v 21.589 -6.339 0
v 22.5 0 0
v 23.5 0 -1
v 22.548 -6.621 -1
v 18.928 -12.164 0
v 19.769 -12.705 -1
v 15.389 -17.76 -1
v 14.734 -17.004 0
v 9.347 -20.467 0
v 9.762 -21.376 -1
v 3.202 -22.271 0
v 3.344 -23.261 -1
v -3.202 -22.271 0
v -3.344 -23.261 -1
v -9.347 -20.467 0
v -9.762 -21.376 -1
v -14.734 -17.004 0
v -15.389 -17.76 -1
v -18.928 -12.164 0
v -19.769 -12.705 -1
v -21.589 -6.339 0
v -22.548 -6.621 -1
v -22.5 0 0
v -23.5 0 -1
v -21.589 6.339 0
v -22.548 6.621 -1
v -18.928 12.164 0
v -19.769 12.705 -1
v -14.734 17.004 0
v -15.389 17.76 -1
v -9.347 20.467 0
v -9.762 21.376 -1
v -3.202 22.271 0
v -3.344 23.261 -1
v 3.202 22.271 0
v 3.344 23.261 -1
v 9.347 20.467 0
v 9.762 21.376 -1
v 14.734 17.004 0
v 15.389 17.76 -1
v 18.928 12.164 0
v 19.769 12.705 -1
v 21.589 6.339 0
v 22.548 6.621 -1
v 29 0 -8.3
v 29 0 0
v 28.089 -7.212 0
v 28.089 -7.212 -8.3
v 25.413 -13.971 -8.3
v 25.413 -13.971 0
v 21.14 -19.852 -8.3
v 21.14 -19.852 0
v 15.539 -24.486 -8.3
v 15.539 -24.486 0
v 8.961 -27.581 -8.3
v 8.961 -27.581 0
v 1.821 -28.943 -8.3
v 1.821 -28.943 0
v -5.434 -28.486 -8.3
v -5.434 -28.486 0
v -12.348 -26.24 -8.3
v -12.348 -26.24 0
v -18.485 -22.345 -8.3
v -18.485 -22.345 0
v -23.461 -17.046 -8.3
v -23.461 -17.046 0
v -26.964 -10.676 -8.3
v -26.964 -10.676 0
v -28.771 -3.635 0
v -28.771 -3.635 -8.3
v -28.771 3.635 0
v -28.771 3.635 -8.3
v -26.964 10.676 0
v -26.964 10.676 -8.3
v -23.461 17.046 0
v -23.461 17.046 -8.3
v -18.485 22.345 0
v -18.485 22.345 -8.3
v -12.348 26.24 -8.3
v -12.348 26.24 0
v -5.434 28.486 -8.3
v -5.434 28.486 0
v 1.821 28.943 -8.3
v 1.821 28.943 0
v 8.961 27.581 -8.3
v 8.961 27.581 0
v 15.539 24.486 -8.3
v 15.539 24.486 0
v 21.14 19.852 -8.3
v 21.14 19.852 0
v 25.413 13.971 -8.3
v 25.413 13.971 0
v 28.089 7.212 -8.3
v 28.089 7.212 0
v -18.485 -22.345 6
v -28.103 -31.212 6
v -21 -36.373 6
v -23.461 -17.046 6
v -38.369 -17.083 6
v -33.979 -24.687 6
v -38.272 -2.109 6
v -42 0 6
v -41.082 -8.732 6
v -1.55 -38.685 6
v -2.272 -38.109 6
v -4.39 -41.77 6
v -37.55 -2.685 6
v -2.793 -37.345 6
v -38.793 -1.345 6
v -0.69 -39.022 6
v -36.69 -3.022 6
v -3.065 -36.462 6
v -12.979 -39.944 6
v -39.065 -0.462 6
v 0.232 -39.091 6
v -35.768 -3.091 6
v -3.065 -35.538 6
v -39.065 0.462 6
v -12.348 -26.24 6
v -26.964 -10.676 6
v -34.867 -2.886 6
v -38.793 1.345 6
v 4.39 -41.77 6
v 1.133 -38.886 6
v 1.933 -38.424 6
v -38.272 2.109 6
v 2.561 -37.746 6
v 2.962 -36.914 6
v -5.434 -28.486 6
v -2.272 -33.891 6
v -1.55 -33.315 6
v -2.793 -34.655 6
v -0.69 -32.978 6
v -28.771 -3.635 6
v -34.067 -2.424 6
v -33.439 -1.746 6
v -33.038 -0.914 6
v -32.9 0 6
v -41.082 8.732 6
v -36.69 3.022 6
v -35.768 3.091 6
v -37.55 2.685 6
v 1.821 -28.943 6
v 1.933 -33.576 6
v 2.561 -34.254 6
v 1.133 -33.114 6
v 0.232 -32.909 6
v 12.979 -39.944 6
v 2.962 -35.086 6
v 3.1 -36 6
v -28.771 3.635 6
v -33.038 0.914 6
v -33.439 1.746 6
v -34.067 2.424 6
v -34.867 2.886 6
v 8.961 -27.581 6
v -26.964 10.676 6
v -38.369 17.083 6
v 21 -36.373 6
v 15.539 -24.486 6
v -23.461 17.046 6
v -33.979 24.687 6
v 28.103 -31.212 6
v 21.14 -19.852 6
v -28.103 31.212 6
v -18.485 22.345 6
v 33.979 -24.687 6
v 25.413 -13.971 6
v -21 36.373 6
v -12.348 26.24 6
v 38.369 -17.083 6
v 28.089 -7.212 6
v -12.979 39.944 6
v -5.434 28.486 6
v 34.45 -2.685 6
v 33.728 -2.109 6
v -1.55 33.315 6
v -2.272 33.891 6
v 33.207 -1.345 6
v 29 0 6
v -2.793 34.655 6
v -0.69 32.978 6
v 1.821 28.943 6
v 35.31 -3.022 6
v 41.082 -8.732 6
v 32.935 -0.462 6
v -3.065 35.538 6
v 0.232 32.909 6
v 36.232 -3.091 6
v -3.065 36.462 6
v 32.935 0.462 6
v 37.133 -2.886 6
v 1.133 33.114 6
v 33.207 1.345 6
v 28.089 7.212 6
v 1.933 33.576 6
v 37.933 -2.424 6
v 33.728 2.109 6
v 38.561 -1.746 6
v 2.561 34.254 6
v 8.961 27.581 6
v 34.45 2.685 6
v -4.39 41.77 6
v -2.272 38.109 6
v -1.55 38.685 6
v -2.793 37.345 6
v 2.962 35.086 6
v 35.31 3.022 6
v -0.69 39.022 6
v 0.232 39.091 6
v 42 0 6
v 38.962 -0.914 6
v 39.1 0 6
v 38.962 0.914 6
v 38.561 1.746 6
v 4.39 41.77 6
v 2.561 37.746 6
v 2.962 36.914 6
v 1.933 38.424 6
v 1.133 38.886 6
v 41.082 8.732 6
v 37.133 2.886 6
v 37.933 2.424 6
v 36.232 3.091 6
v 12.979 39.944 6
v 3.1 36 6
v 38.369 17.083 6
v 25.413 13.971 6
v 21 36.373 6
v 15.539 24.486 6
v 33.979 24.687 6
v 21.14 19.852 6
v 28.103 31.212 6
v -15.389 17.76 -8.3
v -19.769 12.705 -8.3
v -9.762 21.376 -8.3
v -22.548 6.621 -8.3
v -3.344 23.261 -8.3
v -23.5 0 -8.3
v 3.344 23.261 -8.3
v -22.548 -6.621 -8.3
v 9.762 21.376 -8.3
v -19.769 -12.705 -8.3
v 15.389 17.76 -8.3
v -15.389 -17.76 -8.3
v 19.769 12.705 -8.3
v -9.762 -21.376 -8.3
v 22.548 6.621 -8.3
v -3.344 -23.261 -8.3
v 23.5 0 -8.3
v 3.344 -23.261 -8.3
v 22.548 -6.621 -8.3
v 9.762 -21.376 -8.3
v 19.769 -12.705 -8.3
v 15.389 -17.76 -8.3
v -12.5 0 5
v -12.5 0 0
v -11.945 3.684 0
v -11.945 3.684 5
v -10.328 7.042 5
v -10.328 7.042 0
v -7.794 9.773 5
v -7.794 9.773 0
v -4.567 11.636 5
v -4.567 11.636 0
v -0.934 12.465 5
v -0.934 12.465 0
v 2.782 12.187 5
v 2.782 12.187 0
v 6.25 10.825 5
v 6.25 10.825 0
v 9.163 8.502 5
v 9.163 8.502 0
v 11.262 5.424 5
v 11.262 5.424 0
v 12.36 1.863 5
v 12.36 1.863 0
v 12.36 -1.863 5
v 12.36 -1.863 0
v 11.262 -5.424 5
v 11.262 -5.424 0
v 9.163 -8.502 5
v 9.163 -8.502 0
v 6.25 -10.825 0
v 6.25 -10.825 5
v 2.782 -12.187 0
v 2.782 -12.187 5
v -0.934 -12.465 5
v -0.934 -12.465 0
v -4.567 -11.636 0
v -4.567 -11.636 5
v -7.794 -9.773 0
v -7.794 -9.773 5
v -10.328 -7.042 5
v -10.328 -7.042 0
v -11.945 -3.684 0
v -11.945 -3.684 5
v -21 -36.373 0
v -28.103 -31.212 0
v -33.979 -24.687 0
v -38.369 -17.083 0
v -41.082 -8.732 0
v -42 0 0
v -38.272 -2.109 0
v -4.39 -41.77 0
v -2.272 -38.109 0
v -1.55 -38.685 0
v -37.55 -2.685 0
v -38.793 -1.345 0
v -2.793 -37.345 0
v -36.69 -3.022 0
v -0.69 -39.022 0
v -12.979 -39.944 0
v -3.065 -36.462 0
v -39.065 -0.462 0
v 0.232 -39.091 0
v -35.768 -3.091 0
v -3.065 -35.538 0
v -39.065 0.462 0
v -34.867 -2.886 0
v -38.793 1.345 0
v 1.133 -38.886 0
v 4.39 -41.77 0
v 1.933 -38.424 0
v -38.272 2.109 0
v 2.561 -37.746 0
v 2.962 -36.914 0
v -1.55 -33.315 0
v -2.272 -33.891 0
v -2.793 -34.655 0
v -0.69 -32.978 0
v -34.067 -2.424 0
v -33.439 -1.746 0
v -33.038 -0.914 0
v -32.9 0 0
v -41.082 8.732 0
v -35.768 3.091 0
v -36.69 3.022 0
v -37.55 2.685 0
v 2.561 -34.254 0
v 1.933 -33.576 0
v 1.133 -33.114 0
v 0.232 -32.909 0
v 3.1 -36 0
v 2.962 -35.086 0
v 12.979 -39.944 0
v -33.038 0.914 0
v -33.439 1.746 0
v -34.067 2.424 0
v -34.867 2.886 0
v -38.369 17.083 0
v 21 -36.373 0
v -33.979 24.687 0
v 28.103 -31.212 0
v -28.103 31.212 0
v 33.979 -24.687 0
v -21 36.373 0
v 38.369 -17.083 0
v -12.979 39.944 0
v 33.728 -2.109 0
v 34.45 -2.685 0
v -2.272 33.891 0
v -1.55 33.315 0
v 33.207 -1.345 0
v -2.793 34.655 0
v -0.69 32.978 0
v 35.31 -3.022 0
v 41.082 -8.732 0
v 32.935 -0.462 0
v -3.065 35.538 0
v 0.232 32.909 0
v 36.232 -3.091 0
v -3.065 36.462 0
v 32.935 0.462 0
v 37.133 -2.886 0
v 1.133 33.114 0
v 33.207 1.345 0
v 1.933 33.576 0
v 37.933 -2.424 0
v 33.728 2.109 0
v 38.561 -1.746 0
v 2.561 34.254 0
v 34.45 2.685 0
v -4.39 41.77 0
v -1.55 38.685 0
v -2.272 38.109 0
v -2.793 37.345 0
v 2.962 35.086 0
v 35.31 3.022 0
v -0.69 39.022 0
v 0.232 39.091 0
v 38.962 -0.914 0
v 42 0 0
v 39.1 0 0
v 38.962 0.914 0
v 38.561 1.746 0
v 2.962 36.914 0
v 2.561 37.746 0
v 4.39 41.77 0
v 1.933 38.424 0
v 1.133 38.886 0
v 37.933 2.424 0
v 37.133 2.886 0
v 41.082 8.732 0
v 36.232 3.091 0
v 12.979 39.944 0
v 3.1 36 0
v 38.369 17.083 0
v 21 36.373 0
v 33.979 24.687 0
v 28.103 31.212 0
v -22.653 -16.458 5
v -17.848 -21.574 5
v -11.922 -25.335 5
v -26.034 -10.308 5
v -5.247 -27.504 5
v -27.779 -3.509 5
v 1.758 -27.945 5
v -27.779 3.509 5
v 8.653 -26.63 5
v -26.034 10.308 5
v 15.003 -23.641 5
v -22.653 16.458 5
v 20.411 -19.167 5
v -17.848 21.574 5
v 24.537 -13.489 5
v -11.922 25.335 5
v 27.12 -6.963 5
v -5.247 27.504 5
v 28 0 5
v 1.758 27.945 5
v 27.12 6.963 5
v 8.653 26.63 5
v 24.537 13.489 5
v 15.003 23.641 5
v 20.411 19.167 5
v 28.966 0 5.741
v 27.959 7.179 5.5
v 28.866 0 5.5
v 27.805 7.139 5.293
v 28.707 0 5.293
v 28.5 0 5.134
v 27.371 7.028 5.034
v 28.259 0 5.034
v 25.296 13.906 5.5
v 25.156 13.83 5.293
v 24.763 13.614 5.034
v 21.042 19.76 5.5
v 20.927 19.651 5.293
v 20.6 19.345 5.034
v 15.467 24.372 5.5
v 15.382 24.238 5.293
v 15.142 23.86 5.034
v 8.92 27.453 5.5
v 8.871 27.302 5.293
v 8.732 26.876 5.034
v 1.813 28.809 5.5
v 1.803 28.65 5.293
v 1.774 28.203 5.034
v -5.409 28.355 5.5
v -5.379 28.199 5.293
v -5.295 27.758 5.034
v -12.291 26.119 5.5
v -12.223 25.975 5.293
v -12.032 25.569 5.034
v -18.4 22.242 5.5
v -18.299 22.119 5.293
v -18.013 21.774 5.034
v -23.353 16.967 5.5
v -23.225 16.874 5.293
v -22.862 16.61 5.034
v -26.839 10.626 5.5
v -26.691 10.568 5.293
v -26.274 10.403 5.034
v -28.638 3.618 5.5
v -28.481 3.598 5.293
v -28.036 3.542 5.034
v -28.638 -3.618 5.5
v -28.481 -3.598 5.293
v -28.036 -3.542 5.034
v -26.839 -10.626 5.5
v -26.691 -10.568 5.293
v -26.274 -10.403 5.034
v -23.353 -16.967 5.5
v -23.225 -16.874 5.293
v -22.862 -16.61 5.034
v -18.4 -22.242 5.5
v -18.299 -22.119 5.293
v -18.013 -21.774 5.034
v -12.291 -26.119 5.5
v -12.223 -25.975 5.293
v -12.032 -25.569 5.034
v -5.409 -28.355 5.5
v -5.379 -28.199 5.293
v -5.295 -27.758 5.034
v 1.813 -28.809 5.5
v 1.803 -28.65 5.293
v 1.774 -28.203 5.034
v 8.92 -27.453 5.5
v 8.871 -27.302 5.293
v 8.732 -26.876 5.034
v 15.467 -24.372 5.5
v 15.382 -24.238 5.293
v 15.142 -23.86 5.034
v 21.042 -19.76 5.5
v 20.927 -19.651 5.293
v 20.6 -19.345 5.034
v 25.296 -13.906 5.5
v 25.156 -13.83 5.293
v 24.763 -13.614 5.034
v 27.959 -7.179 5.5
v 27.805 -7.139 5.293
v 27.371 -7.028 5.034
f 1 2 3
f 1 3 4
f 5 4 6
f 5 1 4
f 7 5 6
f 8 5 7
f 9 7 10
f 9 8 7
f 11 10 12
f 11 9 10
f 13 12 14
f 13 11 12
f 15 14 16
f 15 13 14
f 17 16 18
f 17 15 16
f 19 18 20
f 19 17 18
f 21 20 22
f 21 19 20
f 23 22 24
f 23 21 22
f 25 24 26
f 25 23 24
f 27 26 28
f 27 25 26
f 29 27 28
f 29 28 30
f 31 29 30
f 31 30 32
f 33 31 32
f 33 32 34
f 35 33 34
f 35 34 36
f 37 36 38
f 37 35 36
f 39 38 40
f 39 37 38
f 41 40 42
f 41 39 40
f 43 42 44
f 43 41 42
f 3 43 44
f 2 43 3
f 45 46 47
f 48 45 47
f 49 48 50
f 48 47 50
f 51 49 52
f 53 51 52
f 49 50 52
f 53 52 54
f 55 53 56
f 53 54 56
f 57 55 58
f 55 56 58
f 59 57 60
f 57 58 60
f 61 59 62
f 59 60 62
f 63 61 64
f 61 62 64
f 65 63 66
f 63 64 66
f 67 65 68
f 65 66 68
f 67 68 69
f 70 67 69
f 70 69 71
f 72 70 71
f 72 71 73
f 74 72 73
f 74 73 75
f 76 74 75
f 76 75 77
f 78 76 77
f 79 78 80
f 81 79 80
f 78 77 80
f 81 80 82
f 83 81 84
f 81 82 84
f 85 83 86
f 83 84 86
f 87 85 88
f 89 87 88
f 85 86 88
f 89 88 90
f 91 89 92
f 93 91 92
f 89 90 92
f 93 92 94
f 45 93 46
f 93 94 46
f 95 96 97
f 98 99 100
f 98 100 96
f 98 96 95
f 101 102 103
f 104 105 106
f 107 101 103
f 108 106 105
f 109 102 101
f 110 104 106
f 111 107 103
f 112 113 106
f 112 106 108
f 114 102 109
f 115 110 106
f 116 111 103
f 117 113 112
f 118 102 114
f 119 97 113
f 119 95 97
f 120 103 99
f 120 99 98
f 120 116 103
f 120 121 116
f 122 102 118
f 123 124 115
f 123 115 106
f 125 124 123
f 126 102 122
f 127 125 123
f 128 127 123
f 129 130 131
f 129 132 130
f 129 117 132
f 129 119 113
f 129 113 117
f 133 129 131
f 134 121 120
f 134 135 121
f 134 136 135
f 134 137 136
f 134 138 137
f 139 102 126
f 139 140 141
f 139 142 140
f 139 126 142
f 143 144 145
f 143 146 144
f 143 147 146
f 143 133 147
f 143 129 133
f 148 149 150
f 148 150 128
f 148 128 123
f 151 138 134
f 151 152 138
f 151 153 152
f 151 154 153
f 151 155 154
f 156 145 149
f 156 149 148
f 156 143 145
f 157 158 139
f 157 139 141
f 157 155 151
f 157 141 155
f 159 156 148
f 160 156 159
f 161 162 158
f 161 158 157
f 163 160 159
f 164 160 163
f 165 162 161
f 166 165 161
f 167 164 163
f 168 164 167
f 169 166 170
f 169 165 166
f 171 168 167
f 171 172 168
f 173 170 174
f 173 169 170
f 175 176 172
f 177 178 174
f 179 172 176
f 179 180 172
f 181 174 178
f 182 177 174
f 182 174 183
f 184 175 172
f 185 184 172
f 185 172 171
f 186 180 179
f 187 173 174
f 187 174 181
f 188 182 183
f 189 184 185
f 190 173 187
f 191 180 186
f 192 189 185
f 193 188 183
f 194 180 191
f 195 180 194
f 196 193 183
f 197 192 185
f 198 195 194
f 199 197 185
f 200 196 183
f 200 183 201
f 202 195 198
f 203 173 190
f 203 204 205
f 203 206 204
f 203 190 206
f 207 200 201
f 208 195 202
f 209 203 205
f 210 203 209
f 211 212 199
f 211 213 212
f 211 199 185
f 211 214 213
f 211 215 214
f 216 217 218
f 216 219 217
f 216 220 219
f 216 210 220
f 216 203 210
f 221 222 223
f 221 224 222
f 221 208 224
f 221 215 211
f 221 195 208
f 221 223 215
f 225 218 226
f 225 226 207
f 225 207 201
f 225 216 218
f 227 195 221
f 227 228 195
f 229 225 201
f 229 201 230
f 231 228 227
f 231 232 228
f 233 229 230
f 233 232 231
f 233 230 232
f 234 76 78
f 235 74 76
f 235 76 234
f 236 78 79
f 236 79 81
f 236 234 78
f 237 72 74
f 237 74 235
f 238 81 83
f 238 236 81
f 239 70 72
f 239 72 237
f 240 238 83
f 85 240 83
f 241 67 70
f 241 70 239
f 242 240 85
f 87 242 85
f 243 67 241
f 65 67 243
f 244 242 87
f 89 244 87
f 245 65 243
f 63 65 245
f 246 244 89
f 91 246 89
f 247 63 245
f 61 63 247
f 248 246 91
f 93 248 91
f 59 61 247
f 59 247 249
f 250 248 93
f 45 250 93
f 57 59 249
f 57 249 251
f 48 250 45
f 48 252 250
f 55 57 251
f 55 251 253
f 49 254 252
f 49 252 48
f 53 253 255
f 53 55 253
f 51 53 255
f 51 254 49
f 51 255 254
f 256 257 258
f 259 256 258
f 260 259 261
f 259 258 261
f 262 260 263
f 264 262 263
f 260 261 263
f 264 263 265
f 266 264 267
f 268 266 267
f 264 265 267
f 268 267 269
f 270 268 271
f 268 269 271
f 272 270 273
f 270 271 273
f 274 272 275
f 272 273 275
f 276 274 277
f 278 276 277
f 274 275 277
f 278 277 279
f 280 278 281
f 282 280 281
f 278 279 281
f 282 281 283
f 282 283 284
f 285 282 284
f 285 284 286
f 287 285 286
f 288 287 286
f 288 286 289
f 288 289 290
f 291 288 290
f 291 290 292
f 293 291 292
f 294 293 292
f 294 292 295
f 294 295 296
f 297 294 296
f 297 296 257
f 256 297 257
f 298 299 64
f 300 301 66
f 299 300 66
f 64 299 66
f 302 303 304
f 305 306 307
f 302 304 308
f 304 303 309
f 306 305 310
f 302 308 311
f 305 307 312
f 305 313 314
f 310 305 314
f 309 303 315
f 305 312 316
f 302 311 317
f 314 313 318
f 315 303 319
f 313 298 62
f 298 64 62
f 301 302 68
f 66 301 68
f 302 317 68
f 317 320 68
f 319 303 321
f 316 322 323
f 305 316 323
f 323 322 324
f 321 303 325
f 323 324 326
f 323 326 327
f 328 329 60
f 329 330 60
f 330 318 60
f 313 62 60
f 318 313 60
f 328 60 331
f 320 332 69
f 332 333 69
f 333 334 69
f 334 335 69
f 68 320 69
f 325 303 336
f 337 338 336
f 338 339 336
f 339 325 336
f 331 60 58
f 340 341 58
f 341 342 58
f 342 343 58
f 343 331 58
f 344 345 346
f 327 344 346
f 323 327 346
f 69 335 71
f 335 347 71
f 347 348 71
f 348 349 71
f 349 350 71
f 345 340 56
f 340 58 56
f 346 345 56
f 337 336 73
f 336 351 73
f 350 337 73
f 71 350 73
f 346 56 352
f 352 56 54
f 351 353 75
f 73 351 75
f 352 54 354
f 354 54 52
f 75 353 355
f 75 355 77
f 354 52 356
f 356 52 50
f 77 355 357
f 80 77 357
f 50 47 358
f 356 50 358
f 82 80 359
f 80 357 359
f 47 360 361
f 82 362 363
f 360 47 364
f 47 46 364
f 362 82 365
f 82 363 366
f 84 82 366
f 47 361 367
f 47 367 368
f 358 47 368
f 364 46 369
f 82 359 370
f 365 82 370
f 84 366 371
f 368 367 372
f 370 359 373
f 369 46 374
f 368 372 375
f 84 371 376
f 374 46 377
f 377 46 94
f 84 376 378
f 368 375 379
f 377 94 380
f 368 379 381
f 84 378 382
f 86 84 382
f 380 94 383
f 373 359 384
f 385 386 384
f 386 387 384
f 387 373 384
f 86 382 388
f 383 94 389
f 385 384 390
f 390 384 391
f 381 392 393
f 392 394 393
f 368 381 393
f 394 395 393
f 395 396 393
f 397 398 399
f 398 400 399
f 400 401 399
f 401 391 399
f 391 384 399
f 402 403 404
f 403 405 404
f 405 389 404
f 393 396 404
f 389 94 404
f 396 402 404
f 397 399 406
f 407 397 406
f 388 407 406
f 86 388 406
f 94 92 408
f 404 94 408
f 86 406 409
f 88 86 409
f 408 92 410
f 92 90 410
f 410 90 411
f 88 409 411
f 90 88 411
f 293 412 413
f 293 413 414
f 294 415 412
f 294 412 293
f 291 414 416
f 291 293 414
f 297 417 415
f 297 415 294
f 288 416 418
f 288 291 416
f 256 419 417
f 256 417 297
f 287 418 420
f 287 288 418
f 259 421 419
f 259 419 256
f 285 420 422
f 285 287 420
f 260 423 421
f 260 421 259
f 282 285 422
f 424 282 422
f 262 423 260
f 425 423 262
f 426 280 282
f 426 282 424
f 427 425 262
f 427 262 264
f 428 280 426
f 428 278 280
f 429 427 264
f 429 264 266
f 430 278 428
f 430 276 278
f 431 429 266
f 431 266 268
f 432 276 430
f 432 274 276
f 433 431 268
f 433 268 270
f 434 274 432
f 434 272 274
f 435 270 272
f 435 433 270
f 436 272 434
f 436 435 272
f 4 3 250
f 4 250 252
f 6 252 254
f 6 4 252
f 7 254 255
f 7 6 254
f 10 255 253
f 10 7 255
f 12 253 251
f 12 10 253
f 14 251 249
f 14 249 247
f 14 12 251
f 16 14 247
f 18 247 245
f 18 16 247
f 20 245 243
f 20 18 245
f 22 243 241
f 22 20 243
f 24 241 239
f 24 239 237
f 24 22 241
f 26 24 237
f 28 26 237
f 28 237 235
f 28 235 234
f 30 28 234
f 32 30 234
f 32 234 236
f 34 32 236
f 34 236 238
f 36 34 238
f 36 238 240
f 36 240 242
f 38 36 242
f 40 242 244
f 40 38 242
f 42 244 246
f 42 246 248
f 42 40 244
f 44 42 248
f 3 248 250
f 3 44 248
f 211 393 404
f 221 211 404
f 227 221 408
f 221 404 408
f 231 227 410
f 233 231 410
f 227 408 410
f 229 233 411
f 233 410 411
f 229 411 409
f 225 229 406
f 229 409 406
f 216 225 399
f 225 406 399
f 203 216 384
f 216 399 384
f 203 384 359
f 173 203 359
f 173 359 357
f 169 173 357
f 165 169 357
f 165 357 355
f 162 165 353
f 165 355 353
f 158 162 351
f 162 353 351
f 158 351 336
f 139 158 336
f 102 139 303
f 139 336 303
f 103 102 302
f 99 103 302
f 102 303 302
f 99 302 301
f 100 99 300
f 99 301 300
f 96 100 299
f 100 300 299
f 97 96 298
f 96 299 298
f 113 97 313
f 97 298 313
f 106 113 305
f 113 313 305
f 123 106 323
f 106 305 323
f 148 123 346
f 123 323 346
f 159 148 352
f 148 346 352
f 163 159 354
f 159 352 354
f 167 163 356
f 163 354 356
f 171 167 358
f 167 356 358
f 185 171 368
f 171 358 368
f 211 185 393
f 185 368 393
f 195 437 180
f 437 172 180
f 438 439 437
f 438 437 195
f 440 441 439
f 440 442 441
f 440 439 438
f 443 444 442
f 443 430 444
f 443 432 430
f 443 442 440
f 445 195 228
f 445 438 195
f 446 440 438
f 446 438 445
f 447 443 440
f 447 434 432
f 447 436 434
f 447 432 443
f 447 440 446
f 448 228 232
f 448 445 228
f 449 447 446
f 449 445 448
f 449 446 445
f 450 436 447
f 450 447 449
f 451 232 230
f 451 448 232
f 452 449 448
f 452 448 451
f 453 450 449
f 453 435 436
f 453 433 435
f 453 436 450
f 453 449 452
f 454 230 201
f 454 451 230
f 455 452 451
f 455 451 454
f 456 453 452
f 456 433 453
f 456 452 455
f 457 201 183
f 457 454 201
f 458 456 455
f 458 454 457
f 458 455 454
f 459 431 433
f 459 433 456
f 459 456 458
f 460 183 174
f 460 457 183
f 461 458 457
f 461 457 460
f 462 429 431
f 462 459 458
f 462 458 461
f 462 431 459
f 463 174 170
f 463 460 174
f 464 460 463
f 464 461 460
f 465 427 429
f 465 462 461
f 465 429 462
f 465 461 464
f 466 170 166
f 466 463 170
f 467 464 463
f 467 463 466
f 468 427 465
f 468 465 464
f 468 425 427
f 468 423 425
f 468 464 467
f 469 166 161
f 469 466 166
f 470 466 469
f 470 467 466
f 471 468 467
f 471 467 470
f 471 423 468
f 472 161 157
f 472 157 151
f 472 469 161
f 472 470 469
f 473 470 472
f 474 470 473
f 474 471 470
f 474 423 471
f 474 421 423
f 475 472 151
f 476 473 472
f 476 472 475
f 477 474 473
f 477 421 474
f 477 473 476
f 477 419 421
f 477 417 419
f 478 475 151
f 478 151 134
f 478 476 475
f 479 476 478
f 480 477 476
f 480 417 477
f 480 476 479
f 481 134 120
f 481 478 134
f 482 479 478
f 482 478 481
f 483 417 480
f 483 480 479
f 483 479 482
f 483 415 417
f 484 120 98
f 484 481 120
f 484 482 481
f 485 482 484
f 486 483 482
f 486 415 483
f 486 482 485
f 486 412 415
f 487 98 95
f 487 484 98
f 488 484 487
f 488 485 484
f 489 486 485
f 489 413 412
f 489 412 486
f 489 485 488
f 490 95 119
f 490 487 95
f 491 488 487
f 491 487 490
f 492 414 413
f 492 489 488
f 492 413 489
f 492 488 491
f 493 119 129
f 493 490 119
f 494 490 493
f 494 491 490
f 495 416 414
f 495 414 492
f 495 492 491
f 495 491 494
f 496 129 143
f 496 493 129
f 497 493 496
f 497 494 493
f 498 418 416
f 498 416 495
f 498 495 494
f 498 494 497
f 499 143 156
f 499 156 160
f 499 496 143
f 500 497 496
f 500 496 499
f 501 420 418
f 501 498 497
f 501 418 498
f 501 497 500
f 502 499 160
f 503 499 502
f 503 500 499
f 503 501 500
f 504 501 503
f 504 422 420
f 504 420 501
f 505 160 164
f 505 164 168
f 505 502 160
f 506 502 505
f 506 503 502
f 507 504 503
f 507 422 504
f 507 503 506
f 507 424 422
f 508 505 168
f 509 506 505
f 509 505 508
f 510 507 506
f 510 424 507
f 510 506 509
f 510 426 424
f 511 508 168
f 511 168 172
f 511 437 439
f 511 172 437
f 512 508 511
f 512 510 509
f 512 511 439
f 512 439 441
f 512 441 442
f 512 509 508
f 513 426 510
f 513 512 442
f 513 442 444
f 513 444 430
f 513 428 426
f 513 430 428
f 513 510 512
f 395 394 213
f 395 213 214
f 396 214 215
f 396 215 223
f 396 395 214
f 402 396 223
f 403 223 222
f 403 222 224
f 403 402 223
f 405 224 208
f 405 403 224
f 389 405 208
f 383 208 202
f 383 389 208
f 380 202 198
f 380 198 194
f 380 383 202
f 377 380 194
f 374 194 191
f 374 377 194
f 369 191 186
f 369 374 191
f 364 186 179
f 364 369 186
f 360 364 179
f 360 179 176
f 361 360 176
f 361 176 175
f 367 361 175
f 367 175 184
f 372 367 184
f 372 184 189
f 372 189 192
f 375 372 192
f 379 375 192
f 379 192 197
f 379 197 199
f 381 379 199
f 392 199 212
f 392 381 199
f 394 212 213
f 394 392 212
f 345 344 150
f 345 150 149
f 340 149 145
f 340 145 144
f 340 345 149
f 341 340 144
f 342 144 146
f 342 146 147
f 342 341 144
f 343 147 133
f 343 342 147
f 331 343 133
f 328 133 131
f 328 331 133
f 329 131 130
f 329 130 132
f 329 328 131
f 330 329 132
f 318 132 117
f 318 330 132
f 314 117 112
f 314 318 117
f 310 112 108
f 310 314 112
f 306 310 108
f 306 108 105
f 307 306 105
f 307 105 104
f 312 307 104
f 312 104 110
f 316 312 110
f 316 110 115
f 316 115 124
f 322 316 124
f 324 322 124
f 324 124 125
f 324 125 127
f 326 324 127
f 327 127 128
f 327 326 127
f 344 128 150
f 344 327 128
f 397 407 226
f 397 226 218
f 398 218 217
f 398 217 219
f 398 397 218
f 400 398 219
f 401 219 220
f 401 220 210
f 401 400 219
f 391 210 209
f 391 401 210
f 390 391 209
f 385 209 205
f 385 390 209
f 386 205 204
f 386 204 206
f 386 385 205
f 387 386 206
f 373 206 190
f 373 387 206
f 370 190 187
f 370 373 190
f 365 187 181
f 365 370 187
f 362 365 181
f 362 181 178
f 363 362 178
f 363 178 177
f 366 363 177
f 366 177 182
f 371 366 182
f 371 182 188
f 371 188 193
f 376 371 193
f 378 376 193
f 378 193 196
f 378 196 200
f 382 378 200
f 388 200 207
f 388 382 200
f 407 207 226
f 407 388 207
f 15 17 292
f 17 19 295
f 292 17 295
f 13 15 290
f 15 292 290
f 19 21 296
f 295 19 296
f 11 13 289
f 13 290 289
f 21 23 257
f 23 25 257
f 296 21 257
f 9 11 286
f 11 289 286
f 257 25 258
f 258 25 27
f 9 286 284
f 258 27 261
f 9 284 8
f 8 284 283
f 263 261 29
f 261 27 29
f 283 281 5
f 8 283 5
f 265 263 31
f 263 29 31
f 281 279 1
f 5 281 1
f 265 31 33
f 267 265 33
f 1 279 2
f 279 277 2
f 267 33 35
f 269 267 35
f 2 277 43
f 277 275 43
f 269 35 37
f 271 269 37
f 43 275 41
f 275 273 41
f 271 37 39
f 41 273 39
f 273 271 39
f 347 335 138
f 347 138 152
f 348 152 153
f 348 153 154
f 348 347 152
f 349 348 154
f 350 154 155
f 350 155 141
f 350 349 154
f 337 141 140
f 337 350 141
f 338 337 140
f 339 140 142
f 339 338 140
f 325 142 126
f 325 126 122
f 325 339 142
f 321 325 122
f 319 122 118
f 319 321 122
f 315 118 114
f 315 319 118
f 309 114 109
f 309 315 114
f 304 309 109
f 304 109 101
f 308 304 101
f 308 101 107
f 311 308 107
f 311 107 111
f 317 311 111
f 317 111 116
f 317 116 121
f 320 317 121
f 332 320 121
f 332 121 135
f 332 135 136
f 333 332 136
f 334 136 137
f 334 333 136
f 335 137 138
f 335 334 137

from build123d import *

# Parameters (mm, degrees)
SKETCH_1_R          = 42
SKETCH_1_R_2        = 3.1
EXTRUDE_1_DEPTH     = 6
SKETCH_2_R          = 29
CUT_EXTRUDE_1_DEPTH = 1
FILLET_3_R          = 1
SKETCH_3_R          = 29
SKETCH_3_R_2        = 23.5
EXTRUDE_2_DEPTH     = 8.3
CHAMFER_1_SIZE      = 1
SKETCH_4_R          = 12.5
CUT_EXTRUDE_2_DEPTH = 8.3


with BuildPart() as part:
    # Эскиз1 → Бобышка-Вытянуть1 (new body)
    with BuildSketch(Plane.XY):
        Circle(SKETCH_1_R)
        with Locations((0, 36)):
            Circle(SKETCH_1_R_2, mode=Mode.SUBTRACT)
        with Locations((36, 0)):
            Circle(SKETCH_1_R_2, mode=Mode.SUBTRACT)
        with Locations((0, -36)):
            Circle(SKETCH_1_R_2, mode=Mode.SUBTRACT)
        with Locations((-36, 0)):
            Circle(SKETCH_1_R_2, mode=Mode.SUBTRACT)
    extrude(amount=EXTRUDE_1_DEPTH)

    # Эскиз2 → Вырез-Вытянуть1 (cut)
    with BuildSketch(Plane.XY.offset(6)):
        Circle(SKETCH_2_R)
    extrude(amount=-CUT_EXTRUDE_1_DEPTH, mode=Mode.SUBTRACT)

    # Скругление3
    fillet_3_edges = [part.edges().sort_by_distance(p)[0] for p in [
        (-29, 0, 5),
    ]]
    fillet(fillet_3_edges, radius=FILLET_3_R - 0.0001)  # a hair under: the kernel refuses the full size

    # Эскиз3 → Бобышка-Вытянуть2 (add)
    with BuildSketch(Plane(origin=(0, 0, 0), x_dir=(-1, 0, 0), z_dir=(0, 0, -1))):
        with Locations(Location((0, 0, 0), (0, 0, 180))):
            Circle(SKETCH_3_R)
        with Locations(Location((0, 0, 0), (0, 0, 180))):
            Circle(SKETCH_3_R_2, mode=Mode.SUBTRACT)
    extrude(amount=EXTRUDE_2_DEPTH)

    # Фаска1
    chamfer_1_edges = [part.edges().sort_by_distance(p)[0] for p in [
        (-23.5, 0, 0),
    ]]
    chamfer(chamfer_1_edges, length=CHAMFER_1_SIZE)

    # Эскиз4 → Вырез-Вытянуть2 (cut)
    with BuildSketch(Plane(origin=(0, 0, 0), x_dir=(-1, 0, 0), z_dir=(0, 0, -1))):
        Circle(SKETCH_4_R)
    extrude(amount=-CUT_EXTRUDE_2_DEPTH, mode=Mode.SUBTRACT)


solid = part.part
